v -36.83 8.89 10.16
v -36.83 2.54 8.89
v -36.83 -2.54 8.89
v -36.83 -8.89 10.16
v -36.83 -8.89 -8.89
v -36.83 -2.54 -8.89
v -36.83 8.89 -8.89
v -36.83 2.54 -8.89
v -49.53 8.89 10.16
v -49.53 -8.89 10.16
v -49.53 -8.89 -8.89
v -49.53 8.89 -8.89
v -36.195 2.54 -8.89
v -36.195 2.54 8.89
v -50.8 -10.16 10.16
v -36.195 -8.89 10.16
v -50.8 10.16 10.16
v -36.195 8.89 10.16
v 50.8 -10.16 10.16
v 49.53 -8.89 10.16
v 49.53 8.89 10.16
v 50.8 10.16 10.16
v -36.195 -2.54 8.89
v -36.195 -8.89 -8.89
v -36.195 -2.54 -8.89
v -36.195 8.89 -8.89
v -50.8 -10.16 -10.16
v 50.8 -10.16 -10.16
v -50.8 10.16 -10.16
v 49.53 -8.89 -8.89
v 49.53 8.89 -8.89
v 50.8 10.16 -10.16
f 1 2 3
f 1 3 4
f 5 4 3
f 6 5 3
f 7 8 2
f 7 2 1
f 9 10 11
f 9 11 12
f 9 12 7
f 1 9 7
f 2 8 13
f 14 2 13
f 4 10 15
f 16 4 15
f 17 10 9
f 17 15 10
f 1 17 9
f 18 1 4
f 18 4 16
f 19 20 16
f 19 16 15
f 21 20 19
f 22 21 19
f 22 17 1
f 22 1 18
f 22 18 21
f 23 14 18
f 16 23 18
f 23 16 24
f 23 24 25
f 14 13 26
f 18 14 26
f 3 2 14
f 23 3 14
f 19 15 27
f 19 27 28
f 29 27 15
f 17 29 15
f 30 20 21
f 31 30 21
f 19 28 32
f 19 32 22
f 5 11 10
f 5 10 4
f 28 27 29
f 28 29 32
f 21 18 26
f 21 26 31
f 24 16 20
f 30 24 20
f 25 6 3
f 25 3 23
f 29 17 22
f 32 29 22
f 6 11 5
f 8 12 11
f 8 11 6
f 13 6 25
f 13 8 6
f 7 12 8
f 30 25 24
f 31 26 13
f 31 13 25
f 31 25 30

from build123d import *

# Parameters (mm, degrees)
F0_W          = 101.6
F0_H          = 20.32
F1_DEPTH      = 10.16
F1_DEPTH_BACK = 10.16
F2_W          = 99.06
F2_H          = 17.78
F3_DEPTH      = 19.05
F4_W          = 0.635
F4_H          = 6.35
F5_DEPTH      = 19.05
F6_START      = 17.78
F4_H_2        = 5.08
F6_DEPTH      = 1.27


with BuildPart() as f1:
    # F0 (on Front) → F1 (new body, two sides)
    with BuildSketch(Plane.XZ) as f1_sk:
        Rectangle(F0_W, F0_H)
    extrude(amount=F1_DEPTH)
    extrude(f1_sk.sketch, amount=-F1_DEPTH_BACK)

    # F2 (on face) → F3 (cut)
    with BuildSketch(Plane.XY.offset(10.16)):
        Rectangle(F2_W, F2_H)
    extrude(amount=-F3_DEPTH, mode=Mode.SUBTRACT)

    # F4 (on face) → F5 (join)
    with BuildSketch(Plane.XY.offset(-8.89)):
        with Locations((-36.5125, -5.715)):
            Rectangle(F4_W, F4_H)
        with Locations((-36.5125, 5.715)):
            Rectangle(F4_W, F4_H)
    extrude(amount=F5_DEPTH)

    # F4 (on face) → F6 (join)
    with BuildSketch(Plane.XY.offset(-8.89).offset(F6_START)):
        with Locations((-36.5125, 0)):
            Rectangle(F4_W, F4_H_2)
    extrude(amount=F6_DEPTH)


solid = f1.part
